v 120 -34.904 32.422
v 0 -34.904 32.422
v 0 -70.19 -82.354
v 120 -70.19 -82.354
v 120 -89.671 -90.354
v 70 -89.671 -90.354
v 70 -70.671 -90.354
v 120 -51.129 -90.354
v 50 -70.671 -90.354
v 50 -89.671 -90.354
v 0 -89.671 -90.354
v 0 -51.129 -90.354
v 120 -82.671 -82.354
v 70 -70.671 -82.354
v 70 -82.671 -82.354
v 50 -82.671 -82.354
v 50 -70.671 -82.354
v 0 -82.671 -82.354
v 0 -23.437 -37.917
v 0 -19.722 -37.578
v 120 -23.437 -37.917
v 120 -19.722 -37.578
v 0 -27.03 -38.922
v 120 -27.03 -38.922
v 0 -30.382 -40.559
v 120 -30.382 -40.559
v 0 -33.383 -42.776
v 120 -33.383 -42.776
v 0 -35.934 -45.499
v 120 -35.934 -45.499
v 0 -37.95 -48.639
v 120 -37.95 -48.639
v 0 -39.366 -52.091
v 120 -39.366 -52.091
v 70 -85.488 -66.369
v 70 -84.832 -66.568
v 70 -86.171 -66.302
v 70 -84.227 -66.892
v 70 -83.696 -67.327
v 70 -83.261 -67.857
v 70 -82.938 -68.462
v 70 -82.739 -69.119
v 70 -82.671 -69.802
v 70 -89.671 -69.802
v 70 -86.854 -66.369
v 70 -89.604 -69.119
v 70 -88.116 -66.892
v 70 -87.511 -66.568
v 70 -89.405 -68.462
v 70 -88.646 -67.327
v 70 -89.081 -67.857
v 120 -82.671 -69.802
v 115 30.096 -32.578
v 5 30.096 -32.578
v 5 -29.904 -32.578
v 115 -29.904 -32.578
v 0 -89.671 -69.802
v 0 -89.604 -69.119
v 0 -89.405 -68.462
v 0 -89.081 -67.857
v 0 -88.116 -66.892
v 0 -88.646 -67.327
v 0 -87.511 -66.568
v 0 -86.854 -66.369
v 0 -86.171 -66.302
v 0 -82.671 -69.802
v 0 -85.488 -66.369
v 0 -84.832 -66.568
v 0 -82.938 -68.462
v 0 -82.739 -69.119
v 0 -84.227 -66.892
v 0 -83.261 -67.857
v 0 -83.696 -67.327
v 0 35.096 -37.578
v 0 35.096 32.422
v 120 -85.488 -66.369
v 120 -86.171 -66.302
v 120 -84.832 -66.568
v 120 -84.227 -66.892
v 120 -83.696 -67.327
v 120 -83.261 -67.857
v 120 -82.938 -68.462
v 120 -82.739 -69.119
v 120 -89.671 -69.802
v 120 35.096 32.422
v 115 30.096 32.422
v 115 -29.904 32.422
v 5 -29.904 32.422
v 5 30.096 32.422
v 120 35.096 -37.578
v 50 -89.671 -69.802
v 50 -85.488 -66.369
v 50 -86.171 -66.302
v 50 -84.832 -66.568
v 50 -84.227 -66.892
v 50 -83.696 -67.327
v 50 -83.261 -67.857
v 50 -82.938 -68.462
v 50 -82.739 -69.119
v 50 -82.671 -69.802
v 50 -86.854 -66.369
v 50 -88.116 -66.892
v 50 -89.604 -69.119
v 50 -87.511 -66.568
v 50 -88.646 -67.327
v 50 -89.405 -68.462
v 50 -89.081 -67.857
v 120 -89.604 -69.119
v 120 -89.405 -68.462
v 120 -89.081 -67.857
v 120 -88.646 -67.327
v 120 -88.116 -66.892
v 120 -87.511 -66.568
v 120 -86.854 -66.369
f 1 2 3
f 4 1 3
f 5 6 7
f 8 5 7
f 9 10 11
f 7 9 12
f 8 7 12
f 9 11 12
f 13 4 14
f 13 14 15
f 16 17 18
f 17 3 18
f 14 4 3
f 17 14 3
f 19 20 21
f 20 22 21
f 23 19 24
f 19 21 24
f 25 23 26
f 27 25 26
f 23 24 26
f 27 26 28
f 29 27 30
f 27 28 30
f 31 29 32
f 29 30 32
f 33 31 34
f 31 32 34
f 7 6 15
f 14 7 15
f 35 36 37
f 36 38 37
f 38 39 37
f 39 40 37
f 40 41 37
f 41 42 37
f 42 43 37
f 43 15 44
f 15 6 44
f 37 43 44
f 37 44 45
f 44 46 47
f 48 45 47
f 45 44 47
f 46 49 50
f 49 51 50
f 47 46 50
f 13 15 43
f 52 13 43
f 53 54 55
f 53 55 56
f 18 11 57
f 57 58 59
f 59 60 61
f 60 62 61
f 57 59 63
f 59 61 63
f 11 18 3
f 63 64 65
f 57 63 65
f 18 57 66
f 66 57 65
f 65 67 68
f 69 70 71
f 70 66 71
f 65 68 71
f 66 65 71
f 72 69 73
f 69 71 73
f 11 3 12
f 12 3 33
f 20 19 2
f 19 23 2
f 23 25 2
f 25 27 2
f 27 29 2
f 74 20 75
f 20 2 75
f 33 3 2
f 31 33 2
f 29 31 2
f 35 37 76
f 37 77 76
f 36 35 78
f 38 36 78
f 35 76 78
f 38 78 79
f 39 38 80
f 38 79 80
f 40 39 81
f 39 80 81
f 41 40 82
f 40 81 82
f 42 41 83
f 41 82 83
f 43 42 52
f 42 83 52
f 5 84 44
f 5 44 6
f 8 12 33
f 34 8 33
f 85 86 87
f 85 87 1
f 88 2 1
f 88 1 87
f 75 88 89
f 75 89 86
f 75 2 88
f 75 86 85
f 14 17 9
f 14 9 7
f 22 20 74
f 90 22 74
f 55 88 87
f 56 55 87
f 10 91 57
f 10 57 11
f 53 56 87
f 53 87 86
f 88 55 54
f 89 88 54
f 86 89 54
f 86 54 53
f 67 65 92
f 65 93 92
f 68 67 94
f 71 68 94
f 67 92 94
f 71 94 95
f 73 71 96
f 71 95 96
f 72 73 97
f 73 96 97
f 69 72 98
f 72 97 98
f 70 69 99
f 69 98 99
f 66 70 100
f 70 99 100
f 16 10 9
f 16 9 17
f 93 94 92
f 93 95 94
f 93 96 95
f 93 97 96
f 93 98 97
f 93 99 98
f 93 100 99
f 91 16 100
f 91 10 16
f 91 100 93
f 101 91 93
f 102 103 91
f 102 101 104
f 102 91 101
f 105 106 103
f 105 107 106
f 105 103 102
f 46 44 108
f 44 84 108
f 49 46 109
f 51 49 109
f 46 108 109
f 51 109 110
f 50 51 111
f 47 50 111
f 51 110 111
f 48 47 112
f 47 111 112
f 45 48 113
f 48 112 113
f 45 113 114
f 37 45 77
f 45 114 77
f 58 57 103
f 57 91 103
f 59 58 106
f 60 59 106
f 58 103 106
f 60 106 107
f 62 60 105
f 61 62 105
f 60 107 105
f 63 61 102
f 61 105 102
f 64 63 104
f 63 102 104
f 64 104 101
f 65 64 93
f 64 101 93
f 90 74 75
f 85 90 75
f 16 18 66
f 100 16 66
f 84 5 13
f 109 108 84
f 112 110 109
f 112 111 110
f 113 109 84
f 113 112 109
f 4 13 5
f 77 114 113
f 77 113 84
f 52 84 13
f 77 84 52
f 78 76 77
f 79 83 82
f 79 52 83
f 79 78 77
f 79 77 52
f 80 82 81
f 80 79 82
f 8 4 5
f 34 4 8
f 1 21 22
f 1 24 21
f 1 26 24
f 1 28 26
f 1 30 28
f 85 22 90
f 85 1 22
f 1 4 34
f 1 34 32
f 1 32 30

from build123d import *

# Parameters (mm, degrees)
F0_W     = 70
F0_H     = 70
F1_DEPTH = 120
F2_W     = 110
F2_H     = 60
F3_DEPTH = 65
F4_W     = 20
F4_H     = 24.0523201227
F5_DEPTH = 19
F6_R     = 20.5517549394
F7_R     = 3.49999


# Not quite as in the source:
# - a fillet or chamfer is up to 0.001 mm smaller than in the source, because OpenCascade refuses the exact size


with BuildPart() as f1:
    # F0 (on Right) → F1 (new body)
    with BuildSketch(Plane.YZ):
        with Locations((0.0956673622, -2.5781301591)):
            Rectangle(F0_W, F0_H)
        Polygon((-34.9043326378, -37.5781301591), (-34.9043326378, 32.4218698409), (-70.1899622679, -82.3540924191), (-82.6712690592, -82.3540924191), (-82.6712690592, -66.3017722964), (-89.6712690592, -66.3017722964), (-89.6712690592, -82.3540924191), (-89.6712690592, -90.3540924191), (-70.1899622679, -90.3540924191), (-51.1292722594, -90.3540924191), align=None)
    extrude(amount=F1_DEPTH)

    # F2 (on face) → F3 (cut)
    with BuildSketch(Plane.XY.offset(32.4218698409)):
        with Locations((60, 0.0956673622)):
            Rectangle(F2_W, F2_H)
    extrude(amount=-F3_DEPTH, mode=Mode.SUBTRACT)

    # F4 (on face) → F5 (cut)
    with BuildSketch(Plane.XZ.offset(89.6712690592)):
        with Locations((60, -78.3279323578)):
            Rectangle(F4_W, F4_H)
    extrude(amount=-F5_DEPTH, mode=Mode.SUBTRACT)

    # F6
    f6_edges = [f1.edges().sort_by_distance(p)[0] for p in [
        (60, -34.904333, -37.57813),
    ]]
    fillet(f6_edges, radius=F6_R)

    # F7 (radius 3.5 in the source; OpenCascade refuses exactly that, so slightly less here)
    f7_edges = [f1.edges().sort_by_distance(p)[0] for p in [
        (95, -82.671269, -66.301772),
        (25, -82.671269, -66.301772),
        (25, -89.671269, -66.301772),
        (95, -89.671269, -66.301772),
    ]]
    fillet(f7_edges, radius=F7_R)


solid = f1.part
